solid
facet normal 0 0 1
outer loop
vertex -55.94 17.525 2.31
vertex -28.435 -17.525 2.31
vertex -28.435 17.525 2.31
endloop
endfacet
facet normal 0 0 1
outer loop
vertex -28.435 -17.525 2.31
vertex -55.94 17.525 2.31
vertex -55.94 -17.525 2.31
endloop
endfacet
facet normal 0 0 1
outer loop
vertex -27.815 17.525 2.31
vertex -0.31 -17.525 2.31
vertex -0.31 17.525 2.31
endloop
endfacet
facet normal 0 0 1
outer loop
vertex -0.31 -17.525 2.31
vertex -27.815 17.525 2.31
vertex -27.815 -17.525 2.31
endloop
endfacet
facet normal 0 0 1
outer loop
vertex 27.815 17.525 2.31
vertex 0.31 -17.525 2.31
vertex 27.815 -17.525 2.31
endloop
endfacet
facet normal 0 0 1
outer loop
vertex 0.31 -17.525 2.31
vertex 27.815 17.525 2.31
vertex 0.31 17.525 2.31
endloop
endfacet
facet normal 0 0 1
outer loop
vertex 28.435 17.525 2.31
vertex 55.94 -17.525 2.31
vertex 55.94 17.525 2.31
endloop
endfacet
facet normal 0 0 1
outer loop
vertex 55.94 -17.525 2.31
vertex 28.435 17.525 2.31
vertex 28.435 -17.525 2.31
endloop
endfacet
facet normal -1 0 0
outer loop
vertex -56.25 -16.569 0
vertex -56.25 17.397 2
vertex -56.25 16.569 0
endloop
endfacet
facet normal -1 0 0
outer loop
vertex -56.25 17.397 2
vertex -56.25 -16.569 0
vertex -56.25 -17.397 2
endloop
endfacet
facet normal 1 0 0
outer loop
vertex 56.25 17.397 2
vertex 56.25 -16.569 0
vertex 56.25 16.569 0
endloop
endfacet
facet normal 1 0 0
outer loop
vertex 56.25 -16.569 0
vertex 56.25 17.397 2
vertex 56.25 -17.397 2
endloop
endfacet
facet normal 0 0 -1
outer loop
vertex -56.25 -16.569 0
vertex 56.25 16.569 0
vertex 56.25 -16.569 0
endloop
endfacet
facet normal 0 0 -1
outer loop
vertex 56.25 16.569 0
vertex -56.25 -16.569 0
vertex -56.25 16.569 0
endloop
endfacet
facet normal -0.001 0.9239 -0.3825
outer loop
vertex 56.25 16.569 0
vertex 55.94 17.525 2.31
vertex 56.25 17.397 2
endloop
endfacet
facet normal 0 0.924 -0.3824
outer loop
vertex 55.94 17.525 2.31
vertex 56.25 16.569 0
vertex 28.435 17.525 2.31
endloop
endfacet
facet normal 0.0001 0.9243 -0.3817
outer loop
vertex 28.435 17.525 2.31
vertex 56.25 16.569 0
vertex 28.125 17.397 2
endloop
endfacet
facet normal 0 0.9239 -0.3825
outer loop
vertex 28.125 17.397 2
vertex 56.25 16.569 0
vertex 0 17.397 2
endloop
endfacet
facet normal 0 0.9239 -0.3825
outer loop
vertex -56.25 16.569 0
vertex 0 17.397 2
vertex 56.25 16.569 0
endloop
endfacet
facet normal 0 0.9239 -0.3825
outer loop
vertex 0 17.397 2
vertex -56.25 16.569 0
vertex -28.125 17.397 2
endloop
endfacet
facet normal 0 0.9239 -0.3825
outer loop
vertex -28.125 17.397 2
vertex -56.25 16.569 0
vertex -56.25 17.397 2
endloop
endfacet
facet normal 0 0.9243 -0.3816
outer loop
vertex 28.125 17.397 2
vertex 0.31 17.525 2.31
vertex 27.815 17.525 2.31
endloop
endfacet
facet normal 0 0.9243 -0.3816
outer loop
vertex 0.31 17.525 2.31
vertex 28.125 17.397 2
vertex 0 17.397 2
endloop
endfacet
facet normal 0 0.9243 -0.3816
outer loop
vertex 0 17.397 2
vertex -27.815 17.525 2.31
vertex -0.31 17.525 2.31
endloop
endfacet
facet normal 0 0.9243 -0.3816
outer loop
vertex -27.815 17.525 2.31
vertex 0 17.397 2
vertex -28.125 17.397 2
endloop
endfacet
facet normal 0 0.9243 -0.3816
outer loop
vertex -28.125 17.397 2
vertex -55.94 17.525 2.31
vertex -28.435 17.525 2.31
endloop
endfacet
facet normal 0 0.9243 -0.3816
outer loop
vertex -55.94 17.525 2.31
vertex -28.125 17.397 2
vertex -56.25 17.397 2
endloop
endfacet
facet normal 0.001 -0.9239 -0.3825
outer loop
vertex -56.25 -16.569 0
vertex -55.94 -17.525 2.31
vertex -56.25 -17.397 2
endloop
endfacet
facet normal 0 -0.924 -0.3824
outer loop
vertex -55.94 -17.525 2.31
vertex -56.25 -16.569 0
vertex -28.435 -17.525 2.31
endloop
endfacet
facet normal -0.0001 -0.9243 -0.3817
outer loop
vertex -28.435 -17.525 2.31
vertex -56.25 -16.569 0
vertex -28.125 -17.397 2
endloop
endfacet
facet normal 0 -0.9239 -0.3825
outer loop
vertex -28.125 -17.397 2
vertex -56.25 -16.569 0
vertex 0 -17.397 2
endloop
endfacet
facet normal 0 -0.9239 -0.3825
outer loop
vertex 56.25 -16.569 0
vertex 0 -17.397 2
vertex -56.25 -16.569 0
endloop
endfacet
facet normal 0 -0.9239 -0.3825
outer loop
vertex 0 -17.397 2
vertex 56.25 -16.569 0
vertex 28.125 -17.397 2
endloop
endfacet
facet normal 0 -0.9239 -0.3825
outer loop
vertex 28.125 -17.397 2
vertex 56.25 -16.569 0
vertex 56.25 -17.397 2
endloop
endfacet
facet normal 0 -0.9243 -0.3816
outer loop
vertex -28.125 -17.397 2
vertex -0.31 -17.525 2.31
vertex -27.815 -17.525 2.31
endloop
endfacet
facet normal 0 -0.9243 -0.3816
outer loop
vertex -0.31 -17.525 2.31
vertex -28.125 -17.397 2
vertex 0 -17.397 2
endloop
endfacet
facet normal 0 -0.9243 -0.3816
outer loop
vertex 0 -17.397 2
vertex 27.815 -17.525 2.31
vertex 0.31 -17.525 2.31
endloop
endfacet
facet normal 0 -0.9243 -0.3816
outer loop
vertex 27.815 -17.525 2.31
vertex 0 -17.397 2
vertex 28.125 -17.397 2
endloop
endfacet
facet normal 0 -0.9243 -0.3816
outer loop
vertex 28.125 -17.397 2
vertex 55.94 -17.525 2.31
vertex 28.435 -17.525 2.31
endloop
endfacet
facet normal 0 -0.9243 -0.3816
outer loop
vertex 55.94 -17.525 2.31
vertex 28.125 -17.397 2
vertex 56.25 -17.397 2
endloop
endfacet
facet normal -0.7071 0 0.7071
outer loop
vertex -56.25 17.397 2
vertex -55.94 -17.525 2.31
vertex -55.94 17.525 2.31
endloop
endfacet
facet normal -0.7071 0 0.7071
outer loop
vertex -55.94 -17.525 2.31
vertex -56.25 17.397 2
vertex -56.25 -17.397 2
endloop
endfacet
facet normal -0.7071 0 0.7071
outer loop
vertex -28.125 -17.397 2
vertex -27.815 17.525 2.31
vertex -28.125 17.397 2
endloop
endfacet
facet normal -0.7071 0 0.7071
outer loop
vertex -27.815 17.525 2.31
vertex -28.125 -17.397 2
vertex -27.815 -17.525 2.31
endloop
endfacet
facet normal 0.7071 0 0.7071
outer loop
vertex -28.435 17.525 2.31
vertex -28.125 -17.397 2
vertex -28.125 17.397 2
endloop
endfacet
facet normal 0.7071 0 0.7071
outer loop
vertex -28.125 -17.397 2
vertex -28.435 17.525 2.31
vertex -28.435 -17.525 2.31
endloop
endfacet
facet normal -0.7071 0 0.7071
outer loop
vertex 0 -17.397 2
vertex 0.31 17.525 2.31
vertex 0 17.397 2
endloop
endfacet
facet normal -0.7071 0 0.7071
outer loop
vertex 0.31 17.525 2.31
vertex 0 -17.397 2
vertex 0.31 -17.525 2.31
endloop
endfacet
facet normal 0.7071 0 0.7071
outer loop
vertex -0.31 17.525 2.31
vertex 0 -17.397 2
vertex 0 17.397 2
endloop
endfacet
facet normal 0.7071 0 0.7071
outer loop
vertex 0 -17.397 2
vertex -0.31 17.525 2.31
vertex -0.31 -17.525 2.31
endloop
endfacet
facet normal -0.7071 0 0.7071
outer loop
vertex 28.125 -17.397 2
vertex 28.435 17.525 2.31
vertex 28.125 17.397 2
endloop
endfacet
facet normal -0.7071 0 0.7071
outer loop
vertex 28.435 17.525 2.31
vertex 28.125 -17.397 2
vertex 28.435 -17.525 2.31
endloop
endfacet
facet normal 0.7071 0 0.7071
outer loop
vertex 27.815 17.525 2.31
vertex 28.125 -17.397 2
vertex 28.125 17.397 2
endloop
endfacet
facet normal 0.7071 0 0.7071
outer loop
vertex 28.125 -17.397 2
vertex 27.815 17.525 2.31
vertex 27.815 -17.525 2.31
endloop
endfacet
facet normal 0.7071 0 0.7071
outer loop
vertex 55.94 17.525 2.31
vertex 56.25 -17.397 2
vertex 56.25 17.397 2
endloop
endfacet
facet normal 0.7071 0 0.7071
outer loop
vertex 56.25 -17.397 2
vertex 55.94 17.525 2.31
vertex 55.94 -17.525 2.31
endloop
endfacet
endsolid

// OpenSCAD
// Paneled cache pot checkered panel.

// ---------- Public parameters (mm) ----------
inside_radius = 75 / 2;
inside_height = 110;
min_wall_thickness = 2.5;
bottom_thickness = 2.5;
bottom_edge_width = 10;
num_panels = 8;
panel_thickness = 2.5;
groove_depth = 0.5;

// ---------- Resolution ----------
$fa = 1;
$fs = 1;

// ---------- Derived ----------
outside_height = inside_height + bottom_thickness;
outside_radius = (inside_radius + min_wall_thickness) / cos(180 / num_panels);

module outside_cylinder() {
  cylinder(outside_height, outside_radius, outside_radius, $fn = num_panels);
}

module inside_cutout() {
  translate([0, 0, bottom_thickness])
    cylinder(inside_height + 1, inside_radius, inside_radius);
  translate([0, 0, -0.5 * bottom_thickness])
    cylinder(2 * bottom_thickness, inside_radius - bottom_edge_width, inside_radius - bottom_edge_width);
}

module core() {
  difference() {
    outside_cylinder();
    inside_cutout();
  }
}

module panel() {
  difference() {
    cylinder(outside_height, outside_radius + panel_thickness, outside_radius + panel_thickness, $fn = num_panels);
    translate([0, 0, -1])
      cylinder(outside_height + 2, outside_radius, outside_radius, $fn = num_panels);
    translate([-(outside_radius + panel_thickness + 1), 0, -1])
      cube([2 * (outside_radius + panel_thickness + 1), 2 * (outside_radius + panel_thickness + 1), outside_height + 2]);
    rotate([0, 0, 180 - 360 / num_panels])
      translate([-(outside_radius + panel_thickness + 1), 0, -1])
        cube([2 * (outside_radius + panel_thickness + 1), 2 * (outside_radius + panel_thickness + 1), outside_height + 2]);
  }
}

module panel_flat_on_bed() {
  translate([outside_height / 2, 0, -(inside_radius + min_wall_thickness)])
    rotate([0, -90, 0])
      rotate([0, 0, 180 / num_panels])
        panel();
}

module panel_groove() {
    translate([0, 0, sqrt(2 * outside_radius * outside_radius) / 2 + panel_thickness - groove_depth]) rotate([0, 45, 0]) cube(outside_radius, center=true);
}

module grooved_panel() {
    difference() {
        panel_flat_on_bed();
        translate([-outside_height / 2, 0, 0]) panel_groove();
        translate([-outside_height / 4, 0, 0]) panel_groove();
        panel_groove();
        translate([outside_height / 4, 0, 0]) panel_groove();
        translate([outside_height / 2, 0, 0]) panel_groove();
    }
}

grooved_panel();
//color("red") panel();
//color("yellow") core();
